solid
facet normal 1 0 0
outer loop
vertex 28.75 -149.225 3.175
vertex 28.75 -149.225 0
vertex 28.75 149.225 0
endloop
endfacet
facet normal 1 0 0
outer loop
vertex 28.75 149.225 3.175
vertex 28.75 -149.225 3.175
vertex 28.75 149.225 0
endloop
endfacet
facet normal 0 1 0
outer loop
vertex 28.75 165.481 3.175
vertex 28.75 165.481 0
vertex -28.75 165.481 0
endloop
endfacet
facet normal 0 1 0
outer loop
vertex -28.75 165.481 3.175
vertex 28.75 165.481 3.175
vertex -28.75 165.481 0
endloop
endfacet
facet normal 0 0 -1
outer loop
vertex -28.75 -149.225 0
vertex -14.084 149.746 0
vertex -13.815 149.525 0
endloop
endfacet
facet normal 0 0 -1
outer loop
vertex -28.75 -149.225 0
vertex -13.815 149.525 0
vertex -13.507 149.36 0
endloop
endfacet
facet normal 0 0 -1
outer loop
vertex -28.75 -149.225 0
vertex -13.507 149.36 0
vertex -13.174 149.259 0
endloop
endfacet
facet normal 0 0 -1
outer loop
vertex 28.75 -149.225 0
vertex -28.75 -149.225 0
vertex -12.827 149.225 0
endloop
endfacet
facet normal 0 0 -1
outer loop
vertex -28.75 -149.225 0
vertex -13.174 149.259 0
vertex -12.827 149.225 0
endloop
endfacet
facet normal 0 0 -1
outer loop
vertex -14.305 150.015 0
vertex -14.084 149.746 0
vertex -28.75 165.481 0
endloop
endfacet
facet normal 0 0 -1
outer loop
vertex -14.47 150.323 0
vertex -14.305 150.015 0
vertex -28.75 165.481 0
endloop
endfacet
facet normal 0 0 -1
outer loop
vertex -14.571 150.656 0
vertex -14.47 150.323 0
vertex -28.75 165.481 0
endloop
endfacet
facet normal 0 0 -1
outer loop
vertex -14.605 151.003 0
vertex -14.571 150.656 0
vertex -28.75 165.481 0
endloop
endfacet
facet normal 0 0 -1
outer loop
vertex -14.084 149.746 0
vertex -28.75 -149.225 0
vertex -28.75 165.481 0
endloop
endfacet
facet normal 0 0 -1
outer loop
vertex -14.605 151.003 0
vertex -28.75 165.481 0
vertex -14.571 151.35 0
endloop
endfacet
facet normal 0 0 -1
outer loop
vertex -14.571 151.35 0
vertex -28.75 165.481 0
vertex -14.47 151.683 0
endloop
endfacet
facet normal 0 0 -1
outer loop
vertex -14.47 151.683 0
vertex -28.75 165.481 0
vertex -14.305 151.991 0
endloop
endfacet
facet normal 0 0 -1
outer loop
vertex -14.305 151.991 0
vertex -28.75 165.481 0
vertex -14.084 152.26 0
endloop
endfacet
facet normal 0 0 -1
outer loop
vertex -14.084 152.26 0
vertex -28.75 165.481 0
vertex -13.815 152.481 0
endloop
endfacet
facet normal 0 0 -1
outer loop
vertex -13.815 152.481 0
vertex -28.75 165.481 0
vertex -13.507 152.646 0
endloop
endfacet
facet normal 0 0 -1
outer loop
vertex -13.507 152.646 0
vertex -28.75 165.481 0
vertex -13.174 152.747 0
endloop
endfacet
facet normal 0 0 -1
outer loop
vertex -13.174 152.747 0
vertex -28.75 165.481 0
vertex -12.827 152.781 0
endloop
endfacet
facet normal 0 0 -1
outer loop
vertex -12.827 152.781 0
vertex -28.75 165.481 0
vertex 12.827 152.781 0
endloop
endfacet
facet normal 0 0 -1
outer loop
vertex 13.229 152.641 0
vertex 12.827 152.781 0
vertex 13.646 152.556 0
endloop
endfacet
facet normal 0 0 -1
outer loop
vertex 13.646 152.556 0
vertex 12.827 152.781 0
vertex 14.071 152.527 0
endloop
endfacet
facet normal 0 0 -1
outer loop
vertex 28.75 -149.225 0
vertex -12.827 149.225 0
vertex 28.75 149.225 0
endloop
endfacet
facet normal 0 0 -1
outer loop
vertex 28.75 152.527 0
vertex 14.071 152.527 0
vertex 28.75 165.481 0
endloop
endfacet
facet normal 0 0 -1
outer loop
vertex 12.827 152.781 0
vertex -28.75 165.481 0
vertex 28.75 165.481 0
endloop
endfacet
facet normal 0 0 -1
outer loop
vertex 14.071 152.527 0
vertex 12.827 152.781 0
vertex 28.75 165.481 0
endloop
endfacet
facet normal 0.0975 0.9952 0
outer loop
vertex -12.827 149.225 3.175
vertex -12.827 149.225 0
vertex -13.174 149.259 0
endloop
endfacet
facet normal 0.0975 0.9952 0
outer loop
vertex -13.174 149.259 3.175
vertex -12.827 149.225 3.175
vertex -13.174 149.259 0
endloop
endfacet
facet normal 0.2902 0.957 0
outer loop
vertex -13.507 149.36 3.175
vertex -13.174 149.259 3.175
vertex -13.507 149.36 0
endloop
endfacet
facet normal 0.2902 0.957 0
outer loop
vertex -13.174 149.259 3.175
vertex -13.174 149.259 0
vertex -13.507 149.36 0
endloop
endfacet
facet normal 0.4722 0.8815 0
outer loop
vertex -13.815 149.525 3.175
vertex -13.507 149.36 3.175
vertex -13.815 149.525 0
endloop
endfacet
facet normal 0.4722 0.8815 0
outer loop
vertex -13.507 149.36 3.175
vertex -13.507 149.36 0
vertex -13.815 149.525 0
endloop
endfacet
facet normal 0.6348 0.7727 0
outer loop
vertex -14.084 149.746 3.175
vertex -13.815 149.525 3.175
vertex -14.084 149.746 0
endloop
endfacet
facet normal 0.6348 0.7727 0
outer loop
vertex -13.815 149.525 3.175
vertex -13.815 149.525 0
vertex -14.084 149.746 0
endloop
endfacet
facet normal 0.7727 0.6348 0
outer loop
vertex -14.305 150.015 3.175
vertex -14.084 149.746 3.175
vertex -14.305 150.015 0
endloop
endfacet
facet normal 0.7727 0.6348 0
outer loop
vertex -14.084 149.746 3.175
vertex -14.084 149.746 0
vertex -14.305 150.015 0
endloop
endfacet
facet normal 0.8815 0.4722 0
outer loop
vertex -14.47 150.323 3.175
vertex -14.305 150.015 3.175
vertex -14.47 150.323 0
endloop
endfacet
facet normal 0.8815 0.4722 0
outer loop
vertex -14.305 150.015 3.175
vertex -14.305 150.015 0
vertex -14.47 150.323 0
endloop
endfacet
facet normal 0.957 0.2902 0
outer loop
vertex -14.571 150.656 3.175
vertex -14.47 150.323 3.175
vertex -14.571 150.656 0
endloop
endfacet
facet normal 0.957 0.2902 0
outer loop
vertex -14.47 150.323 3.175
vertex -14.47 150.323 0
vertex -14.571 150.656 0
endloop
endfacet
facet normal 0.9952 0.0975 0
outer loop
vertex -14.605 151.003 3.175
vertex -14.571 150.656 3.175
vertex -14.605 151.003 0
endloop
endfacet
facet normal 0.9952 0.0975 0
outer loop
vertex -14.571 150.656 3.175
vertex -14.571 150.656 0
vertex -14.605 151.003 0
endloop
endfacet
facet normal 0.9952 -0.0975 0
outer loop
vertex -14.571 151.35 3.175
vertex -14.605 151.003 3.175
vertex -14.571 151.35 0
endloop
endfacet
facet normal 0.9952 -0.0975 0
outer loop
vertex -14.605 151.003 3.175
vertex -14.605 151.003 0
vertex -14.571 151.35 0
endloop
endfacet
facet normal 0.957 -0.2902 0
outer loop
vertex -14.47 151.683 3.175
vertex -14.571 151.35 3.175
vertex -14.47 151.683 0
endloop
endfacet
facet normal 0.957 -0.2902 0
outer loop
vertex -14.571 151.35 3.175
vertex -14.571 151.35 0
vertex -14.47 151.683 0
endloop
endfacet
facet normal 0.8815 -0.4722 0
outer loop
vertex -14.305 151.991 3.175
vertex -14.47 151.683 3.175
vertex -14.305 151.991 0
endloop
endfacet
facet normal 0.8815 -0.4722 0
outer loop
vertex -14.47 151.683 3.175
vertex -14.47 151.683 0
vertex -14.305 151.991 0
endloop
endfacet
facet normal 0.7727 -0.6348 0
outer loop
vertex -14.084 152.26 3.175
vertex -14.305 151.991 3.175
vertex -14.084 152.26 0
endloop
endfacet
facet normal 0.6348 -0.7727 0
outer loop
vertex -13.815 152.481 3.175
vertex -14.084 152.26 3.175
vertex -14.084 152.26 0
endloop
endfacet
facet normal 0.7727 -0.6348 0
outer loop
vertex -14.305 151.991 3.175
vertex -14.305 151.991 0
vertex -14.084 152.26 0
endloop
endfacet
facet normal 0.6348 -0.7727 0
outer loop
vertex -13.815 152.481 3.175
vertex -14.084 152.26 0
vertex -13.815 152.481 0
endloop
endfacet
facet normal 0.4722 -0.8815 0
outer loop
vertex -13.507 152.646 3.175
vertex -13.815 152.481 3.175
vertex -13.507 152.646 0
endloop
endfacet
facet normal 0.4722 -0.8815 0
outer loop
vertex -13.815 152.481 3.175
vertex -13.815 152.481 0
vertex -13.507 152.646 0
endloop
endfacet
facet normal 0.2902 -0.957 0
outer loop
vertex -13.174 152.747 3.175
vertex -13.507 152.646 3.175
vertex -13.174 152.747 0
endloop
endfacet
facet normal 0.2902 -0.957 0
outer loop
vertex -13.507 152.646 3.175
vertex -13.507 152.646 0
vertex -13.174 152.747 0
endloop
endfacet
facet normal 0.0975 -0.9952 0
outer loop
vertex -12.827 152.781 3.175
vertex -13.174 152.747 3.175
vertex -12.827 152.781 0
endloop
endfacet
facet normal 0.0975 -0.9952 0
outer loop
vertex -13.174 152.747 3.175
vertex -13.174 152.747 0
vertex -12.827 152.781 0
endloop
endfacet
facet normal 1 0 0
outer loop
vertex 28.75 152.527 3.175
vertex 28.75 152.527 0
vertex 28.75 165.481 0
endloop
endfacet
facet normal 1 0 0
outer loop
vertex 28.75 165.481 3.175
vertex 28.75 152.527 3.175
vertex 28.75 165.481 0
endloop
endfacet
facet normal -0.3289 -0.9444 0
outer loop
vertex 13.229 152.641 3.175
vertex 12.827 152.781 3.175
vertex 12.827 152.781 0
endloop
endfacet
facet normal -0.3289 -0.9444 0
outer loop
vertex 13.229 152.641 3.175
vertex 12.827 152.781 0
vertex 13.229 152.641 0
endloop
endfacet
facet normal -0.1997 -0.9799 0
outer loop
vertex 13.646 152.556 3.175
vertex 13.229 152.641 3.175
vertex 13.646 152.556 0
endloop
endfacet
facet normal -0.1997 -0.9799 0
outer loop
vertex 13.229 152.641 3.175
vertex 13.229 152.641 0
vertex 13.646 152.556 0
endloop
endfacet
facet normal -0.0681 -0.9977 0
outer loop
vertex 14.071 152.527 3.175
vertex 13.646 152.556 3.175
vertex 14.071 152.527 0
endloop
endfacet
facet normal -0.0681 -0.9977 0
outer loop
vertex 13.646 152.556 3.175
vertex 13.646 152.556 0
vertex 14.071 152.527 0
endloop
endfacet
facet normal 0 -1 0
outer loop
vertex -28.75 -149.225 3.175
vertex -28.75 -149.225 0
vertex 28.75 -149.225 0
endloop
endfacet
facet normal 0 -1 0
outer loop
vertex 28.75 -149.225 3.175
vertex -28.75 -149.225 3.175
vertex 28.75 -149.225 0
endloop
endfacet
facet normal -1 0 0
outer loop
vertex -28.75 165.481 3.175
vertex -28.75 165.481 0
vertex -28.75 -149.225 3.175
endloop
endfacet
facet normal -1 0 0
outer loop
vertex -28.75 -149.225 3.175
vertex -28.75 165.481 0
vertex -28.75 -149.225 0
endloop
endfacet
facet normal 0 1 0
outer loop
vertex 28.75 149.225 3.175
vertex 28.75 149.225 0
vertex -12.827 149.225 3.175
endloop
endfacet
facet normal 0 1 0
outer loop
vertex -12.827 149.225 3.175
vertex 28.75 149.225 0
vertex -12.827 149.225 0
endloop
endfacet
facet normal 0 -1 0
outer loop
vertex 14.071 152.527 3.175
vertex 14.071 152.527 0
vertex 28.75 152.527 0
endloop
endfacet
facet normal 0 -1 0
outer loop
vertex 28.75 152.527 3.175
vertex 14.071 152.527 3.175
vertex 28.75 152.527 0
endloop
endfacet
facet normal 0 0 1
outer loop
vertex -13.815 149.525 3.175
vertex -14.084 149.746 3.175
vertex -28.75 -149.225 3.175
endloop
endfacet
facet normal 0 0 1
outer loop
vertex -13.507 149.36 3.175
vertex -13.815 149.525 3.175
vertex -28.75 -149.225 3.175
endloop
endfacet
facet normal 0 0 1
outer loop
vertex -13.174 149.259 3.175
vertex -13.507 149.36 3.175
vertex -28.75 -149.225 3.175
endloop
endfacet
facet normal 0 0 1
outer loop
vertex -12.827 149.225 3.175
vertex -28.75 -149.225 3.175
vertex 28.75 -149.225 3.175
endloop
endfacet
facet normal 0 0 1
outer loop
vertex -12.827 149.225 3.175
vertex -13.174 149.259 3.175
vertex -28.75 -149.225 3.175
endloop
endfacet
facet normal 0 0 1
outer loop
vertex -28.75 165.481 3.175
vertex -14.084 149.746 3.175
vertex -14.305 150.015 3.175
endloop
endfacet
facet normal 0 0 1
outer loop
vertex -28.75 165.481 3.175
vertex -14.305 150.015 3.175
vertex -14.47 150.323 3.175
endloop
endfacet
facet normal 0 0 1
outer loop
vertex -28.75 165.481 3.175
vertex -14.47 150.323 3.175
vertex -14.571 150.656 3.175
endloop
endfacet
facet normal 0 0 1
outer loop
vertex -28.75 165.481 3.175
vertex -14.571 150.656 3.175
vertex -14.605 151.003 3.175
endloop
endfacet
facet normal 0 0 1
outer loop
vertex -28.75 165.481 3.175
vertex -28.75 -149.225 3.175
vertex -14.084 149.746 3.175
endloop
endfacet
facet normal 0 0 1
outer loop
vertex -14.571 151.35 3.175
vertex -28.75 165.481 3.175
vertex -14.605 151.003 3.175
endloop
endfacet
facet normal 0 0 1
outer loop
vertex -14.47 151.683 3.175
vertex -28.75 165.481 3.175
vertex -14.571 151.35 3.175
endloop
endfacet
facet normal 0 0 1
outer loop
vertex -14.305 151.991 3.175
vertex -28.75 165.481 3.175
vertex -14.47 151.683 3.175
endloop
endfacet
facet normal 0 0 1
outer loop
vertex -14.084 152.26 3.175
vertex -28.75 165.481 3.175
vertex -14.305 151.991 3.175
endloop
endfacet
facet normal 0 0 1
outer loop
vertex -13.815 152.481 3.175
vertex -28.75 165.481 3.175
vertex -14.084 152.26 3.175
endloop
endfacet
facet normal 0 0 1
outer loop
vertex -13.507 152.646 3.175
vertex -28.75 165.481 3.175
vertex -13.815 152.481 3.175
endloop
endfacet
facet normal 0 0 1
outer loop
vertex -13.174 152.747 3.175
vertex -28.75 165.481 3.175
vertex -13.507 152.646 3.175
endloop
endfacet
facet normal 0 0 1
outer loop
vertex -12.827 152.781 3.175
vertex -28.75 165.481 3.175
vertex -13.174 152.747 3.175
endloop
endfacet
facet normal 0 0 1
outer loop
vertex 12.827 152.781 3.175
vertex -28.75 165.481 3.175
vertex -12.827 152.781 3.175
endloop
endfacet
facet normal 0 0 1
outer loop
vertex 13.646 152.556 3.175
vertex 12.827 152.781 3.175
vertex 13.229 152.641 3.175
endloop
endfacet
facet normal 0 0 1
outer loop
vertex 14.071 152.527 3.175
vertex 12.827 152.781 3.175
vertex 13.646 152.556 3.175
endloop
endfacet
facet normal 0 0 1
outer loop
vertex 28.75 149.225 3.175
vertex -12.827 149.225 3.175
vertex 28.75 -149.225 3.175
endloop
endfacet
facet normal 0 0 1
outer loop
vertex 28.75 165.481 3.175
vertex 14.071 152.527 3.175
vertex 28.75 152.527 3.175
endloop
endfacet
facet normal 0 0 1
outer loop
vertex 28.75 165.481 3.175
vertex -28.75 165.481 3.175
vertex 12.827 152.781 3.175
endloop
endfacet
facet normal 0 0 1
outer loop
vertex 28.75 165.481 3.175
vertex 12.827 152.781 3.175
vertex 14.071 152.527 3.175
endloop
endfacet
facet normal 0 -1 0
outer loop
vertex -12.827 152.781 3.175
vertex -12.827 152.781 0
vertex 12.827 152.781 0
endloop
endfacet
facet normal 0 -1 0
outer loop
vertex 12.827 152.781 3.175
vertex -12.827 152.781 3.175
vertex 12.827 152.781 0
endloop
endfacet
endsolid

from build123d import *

# Parameters (mm, degrees)
BOSS_EXTRUDE1_DEPTH = 3.175
FILLET1_R           = 3.175


with BuildPart() as part:
    # Sketch1 → Boss-Extrude1 (new body)
    with BuildSketch(Plane.XY):
        with BuildLine():
            Line((-28.75, 165.481), (-28.75, 149.225))
            Line((-28.75, 149.225), (-12.827, 149.225))
            ThreePointArc((-12.827, 149.225), (-14.605, 151.003), (-12.827, 152.781))
            Line((-12.827, 152.781), (12.827, 152.781))
            Line((12.827, 152.781), (12.827, 152.527))
            Line((12.827, 152.527), (28.75, 152.527))
            Line((28.75, 152.527), (28.75, 165.481))
            Line((28.75, 165.481), (-28.75, 165.481))
        make_face()
        Polygon((-12.827, 149.225), (-28.75, 149.225), (-28.75, -149.225), (28.75, -149.225), (28.75, 149.225), align=None)
    extrude(amount=BOSS_EXTRUDE1_DEPTH)

    # Fillet1
    # the kernel refuses this fillet: 3.175 mm, written as the material it takes off along each edge
    with BuildSketch(Plane(origin=(12.827, 152.527, -3.110851973), x_dir=(1, 0, 0), z_dir=(0, 0, 1))) as fillet1_piece_1:
        with BuildLine():
            CenterArc((1.244340789, 3.175), FILLET1_R, 246.926081934, 23.073918066)
            Line((0, 0.254), (-0.024886816, 0.19558))
            ThreePointArc((-0.024886816, 0.19558), (-0.0635, 0.127), (-0.0635, 0))
            Line((-0.0635, 0), (0, -0.0635))
            Line((0, -0.0635), (1.244340789, -0.0635))
            Line((1.244340789, -0.0635), (1.244340789, 0))
        make_face()
    extrude(amount=9.396703947, mode=Mode.SUBTRACT)


solid = part.part
